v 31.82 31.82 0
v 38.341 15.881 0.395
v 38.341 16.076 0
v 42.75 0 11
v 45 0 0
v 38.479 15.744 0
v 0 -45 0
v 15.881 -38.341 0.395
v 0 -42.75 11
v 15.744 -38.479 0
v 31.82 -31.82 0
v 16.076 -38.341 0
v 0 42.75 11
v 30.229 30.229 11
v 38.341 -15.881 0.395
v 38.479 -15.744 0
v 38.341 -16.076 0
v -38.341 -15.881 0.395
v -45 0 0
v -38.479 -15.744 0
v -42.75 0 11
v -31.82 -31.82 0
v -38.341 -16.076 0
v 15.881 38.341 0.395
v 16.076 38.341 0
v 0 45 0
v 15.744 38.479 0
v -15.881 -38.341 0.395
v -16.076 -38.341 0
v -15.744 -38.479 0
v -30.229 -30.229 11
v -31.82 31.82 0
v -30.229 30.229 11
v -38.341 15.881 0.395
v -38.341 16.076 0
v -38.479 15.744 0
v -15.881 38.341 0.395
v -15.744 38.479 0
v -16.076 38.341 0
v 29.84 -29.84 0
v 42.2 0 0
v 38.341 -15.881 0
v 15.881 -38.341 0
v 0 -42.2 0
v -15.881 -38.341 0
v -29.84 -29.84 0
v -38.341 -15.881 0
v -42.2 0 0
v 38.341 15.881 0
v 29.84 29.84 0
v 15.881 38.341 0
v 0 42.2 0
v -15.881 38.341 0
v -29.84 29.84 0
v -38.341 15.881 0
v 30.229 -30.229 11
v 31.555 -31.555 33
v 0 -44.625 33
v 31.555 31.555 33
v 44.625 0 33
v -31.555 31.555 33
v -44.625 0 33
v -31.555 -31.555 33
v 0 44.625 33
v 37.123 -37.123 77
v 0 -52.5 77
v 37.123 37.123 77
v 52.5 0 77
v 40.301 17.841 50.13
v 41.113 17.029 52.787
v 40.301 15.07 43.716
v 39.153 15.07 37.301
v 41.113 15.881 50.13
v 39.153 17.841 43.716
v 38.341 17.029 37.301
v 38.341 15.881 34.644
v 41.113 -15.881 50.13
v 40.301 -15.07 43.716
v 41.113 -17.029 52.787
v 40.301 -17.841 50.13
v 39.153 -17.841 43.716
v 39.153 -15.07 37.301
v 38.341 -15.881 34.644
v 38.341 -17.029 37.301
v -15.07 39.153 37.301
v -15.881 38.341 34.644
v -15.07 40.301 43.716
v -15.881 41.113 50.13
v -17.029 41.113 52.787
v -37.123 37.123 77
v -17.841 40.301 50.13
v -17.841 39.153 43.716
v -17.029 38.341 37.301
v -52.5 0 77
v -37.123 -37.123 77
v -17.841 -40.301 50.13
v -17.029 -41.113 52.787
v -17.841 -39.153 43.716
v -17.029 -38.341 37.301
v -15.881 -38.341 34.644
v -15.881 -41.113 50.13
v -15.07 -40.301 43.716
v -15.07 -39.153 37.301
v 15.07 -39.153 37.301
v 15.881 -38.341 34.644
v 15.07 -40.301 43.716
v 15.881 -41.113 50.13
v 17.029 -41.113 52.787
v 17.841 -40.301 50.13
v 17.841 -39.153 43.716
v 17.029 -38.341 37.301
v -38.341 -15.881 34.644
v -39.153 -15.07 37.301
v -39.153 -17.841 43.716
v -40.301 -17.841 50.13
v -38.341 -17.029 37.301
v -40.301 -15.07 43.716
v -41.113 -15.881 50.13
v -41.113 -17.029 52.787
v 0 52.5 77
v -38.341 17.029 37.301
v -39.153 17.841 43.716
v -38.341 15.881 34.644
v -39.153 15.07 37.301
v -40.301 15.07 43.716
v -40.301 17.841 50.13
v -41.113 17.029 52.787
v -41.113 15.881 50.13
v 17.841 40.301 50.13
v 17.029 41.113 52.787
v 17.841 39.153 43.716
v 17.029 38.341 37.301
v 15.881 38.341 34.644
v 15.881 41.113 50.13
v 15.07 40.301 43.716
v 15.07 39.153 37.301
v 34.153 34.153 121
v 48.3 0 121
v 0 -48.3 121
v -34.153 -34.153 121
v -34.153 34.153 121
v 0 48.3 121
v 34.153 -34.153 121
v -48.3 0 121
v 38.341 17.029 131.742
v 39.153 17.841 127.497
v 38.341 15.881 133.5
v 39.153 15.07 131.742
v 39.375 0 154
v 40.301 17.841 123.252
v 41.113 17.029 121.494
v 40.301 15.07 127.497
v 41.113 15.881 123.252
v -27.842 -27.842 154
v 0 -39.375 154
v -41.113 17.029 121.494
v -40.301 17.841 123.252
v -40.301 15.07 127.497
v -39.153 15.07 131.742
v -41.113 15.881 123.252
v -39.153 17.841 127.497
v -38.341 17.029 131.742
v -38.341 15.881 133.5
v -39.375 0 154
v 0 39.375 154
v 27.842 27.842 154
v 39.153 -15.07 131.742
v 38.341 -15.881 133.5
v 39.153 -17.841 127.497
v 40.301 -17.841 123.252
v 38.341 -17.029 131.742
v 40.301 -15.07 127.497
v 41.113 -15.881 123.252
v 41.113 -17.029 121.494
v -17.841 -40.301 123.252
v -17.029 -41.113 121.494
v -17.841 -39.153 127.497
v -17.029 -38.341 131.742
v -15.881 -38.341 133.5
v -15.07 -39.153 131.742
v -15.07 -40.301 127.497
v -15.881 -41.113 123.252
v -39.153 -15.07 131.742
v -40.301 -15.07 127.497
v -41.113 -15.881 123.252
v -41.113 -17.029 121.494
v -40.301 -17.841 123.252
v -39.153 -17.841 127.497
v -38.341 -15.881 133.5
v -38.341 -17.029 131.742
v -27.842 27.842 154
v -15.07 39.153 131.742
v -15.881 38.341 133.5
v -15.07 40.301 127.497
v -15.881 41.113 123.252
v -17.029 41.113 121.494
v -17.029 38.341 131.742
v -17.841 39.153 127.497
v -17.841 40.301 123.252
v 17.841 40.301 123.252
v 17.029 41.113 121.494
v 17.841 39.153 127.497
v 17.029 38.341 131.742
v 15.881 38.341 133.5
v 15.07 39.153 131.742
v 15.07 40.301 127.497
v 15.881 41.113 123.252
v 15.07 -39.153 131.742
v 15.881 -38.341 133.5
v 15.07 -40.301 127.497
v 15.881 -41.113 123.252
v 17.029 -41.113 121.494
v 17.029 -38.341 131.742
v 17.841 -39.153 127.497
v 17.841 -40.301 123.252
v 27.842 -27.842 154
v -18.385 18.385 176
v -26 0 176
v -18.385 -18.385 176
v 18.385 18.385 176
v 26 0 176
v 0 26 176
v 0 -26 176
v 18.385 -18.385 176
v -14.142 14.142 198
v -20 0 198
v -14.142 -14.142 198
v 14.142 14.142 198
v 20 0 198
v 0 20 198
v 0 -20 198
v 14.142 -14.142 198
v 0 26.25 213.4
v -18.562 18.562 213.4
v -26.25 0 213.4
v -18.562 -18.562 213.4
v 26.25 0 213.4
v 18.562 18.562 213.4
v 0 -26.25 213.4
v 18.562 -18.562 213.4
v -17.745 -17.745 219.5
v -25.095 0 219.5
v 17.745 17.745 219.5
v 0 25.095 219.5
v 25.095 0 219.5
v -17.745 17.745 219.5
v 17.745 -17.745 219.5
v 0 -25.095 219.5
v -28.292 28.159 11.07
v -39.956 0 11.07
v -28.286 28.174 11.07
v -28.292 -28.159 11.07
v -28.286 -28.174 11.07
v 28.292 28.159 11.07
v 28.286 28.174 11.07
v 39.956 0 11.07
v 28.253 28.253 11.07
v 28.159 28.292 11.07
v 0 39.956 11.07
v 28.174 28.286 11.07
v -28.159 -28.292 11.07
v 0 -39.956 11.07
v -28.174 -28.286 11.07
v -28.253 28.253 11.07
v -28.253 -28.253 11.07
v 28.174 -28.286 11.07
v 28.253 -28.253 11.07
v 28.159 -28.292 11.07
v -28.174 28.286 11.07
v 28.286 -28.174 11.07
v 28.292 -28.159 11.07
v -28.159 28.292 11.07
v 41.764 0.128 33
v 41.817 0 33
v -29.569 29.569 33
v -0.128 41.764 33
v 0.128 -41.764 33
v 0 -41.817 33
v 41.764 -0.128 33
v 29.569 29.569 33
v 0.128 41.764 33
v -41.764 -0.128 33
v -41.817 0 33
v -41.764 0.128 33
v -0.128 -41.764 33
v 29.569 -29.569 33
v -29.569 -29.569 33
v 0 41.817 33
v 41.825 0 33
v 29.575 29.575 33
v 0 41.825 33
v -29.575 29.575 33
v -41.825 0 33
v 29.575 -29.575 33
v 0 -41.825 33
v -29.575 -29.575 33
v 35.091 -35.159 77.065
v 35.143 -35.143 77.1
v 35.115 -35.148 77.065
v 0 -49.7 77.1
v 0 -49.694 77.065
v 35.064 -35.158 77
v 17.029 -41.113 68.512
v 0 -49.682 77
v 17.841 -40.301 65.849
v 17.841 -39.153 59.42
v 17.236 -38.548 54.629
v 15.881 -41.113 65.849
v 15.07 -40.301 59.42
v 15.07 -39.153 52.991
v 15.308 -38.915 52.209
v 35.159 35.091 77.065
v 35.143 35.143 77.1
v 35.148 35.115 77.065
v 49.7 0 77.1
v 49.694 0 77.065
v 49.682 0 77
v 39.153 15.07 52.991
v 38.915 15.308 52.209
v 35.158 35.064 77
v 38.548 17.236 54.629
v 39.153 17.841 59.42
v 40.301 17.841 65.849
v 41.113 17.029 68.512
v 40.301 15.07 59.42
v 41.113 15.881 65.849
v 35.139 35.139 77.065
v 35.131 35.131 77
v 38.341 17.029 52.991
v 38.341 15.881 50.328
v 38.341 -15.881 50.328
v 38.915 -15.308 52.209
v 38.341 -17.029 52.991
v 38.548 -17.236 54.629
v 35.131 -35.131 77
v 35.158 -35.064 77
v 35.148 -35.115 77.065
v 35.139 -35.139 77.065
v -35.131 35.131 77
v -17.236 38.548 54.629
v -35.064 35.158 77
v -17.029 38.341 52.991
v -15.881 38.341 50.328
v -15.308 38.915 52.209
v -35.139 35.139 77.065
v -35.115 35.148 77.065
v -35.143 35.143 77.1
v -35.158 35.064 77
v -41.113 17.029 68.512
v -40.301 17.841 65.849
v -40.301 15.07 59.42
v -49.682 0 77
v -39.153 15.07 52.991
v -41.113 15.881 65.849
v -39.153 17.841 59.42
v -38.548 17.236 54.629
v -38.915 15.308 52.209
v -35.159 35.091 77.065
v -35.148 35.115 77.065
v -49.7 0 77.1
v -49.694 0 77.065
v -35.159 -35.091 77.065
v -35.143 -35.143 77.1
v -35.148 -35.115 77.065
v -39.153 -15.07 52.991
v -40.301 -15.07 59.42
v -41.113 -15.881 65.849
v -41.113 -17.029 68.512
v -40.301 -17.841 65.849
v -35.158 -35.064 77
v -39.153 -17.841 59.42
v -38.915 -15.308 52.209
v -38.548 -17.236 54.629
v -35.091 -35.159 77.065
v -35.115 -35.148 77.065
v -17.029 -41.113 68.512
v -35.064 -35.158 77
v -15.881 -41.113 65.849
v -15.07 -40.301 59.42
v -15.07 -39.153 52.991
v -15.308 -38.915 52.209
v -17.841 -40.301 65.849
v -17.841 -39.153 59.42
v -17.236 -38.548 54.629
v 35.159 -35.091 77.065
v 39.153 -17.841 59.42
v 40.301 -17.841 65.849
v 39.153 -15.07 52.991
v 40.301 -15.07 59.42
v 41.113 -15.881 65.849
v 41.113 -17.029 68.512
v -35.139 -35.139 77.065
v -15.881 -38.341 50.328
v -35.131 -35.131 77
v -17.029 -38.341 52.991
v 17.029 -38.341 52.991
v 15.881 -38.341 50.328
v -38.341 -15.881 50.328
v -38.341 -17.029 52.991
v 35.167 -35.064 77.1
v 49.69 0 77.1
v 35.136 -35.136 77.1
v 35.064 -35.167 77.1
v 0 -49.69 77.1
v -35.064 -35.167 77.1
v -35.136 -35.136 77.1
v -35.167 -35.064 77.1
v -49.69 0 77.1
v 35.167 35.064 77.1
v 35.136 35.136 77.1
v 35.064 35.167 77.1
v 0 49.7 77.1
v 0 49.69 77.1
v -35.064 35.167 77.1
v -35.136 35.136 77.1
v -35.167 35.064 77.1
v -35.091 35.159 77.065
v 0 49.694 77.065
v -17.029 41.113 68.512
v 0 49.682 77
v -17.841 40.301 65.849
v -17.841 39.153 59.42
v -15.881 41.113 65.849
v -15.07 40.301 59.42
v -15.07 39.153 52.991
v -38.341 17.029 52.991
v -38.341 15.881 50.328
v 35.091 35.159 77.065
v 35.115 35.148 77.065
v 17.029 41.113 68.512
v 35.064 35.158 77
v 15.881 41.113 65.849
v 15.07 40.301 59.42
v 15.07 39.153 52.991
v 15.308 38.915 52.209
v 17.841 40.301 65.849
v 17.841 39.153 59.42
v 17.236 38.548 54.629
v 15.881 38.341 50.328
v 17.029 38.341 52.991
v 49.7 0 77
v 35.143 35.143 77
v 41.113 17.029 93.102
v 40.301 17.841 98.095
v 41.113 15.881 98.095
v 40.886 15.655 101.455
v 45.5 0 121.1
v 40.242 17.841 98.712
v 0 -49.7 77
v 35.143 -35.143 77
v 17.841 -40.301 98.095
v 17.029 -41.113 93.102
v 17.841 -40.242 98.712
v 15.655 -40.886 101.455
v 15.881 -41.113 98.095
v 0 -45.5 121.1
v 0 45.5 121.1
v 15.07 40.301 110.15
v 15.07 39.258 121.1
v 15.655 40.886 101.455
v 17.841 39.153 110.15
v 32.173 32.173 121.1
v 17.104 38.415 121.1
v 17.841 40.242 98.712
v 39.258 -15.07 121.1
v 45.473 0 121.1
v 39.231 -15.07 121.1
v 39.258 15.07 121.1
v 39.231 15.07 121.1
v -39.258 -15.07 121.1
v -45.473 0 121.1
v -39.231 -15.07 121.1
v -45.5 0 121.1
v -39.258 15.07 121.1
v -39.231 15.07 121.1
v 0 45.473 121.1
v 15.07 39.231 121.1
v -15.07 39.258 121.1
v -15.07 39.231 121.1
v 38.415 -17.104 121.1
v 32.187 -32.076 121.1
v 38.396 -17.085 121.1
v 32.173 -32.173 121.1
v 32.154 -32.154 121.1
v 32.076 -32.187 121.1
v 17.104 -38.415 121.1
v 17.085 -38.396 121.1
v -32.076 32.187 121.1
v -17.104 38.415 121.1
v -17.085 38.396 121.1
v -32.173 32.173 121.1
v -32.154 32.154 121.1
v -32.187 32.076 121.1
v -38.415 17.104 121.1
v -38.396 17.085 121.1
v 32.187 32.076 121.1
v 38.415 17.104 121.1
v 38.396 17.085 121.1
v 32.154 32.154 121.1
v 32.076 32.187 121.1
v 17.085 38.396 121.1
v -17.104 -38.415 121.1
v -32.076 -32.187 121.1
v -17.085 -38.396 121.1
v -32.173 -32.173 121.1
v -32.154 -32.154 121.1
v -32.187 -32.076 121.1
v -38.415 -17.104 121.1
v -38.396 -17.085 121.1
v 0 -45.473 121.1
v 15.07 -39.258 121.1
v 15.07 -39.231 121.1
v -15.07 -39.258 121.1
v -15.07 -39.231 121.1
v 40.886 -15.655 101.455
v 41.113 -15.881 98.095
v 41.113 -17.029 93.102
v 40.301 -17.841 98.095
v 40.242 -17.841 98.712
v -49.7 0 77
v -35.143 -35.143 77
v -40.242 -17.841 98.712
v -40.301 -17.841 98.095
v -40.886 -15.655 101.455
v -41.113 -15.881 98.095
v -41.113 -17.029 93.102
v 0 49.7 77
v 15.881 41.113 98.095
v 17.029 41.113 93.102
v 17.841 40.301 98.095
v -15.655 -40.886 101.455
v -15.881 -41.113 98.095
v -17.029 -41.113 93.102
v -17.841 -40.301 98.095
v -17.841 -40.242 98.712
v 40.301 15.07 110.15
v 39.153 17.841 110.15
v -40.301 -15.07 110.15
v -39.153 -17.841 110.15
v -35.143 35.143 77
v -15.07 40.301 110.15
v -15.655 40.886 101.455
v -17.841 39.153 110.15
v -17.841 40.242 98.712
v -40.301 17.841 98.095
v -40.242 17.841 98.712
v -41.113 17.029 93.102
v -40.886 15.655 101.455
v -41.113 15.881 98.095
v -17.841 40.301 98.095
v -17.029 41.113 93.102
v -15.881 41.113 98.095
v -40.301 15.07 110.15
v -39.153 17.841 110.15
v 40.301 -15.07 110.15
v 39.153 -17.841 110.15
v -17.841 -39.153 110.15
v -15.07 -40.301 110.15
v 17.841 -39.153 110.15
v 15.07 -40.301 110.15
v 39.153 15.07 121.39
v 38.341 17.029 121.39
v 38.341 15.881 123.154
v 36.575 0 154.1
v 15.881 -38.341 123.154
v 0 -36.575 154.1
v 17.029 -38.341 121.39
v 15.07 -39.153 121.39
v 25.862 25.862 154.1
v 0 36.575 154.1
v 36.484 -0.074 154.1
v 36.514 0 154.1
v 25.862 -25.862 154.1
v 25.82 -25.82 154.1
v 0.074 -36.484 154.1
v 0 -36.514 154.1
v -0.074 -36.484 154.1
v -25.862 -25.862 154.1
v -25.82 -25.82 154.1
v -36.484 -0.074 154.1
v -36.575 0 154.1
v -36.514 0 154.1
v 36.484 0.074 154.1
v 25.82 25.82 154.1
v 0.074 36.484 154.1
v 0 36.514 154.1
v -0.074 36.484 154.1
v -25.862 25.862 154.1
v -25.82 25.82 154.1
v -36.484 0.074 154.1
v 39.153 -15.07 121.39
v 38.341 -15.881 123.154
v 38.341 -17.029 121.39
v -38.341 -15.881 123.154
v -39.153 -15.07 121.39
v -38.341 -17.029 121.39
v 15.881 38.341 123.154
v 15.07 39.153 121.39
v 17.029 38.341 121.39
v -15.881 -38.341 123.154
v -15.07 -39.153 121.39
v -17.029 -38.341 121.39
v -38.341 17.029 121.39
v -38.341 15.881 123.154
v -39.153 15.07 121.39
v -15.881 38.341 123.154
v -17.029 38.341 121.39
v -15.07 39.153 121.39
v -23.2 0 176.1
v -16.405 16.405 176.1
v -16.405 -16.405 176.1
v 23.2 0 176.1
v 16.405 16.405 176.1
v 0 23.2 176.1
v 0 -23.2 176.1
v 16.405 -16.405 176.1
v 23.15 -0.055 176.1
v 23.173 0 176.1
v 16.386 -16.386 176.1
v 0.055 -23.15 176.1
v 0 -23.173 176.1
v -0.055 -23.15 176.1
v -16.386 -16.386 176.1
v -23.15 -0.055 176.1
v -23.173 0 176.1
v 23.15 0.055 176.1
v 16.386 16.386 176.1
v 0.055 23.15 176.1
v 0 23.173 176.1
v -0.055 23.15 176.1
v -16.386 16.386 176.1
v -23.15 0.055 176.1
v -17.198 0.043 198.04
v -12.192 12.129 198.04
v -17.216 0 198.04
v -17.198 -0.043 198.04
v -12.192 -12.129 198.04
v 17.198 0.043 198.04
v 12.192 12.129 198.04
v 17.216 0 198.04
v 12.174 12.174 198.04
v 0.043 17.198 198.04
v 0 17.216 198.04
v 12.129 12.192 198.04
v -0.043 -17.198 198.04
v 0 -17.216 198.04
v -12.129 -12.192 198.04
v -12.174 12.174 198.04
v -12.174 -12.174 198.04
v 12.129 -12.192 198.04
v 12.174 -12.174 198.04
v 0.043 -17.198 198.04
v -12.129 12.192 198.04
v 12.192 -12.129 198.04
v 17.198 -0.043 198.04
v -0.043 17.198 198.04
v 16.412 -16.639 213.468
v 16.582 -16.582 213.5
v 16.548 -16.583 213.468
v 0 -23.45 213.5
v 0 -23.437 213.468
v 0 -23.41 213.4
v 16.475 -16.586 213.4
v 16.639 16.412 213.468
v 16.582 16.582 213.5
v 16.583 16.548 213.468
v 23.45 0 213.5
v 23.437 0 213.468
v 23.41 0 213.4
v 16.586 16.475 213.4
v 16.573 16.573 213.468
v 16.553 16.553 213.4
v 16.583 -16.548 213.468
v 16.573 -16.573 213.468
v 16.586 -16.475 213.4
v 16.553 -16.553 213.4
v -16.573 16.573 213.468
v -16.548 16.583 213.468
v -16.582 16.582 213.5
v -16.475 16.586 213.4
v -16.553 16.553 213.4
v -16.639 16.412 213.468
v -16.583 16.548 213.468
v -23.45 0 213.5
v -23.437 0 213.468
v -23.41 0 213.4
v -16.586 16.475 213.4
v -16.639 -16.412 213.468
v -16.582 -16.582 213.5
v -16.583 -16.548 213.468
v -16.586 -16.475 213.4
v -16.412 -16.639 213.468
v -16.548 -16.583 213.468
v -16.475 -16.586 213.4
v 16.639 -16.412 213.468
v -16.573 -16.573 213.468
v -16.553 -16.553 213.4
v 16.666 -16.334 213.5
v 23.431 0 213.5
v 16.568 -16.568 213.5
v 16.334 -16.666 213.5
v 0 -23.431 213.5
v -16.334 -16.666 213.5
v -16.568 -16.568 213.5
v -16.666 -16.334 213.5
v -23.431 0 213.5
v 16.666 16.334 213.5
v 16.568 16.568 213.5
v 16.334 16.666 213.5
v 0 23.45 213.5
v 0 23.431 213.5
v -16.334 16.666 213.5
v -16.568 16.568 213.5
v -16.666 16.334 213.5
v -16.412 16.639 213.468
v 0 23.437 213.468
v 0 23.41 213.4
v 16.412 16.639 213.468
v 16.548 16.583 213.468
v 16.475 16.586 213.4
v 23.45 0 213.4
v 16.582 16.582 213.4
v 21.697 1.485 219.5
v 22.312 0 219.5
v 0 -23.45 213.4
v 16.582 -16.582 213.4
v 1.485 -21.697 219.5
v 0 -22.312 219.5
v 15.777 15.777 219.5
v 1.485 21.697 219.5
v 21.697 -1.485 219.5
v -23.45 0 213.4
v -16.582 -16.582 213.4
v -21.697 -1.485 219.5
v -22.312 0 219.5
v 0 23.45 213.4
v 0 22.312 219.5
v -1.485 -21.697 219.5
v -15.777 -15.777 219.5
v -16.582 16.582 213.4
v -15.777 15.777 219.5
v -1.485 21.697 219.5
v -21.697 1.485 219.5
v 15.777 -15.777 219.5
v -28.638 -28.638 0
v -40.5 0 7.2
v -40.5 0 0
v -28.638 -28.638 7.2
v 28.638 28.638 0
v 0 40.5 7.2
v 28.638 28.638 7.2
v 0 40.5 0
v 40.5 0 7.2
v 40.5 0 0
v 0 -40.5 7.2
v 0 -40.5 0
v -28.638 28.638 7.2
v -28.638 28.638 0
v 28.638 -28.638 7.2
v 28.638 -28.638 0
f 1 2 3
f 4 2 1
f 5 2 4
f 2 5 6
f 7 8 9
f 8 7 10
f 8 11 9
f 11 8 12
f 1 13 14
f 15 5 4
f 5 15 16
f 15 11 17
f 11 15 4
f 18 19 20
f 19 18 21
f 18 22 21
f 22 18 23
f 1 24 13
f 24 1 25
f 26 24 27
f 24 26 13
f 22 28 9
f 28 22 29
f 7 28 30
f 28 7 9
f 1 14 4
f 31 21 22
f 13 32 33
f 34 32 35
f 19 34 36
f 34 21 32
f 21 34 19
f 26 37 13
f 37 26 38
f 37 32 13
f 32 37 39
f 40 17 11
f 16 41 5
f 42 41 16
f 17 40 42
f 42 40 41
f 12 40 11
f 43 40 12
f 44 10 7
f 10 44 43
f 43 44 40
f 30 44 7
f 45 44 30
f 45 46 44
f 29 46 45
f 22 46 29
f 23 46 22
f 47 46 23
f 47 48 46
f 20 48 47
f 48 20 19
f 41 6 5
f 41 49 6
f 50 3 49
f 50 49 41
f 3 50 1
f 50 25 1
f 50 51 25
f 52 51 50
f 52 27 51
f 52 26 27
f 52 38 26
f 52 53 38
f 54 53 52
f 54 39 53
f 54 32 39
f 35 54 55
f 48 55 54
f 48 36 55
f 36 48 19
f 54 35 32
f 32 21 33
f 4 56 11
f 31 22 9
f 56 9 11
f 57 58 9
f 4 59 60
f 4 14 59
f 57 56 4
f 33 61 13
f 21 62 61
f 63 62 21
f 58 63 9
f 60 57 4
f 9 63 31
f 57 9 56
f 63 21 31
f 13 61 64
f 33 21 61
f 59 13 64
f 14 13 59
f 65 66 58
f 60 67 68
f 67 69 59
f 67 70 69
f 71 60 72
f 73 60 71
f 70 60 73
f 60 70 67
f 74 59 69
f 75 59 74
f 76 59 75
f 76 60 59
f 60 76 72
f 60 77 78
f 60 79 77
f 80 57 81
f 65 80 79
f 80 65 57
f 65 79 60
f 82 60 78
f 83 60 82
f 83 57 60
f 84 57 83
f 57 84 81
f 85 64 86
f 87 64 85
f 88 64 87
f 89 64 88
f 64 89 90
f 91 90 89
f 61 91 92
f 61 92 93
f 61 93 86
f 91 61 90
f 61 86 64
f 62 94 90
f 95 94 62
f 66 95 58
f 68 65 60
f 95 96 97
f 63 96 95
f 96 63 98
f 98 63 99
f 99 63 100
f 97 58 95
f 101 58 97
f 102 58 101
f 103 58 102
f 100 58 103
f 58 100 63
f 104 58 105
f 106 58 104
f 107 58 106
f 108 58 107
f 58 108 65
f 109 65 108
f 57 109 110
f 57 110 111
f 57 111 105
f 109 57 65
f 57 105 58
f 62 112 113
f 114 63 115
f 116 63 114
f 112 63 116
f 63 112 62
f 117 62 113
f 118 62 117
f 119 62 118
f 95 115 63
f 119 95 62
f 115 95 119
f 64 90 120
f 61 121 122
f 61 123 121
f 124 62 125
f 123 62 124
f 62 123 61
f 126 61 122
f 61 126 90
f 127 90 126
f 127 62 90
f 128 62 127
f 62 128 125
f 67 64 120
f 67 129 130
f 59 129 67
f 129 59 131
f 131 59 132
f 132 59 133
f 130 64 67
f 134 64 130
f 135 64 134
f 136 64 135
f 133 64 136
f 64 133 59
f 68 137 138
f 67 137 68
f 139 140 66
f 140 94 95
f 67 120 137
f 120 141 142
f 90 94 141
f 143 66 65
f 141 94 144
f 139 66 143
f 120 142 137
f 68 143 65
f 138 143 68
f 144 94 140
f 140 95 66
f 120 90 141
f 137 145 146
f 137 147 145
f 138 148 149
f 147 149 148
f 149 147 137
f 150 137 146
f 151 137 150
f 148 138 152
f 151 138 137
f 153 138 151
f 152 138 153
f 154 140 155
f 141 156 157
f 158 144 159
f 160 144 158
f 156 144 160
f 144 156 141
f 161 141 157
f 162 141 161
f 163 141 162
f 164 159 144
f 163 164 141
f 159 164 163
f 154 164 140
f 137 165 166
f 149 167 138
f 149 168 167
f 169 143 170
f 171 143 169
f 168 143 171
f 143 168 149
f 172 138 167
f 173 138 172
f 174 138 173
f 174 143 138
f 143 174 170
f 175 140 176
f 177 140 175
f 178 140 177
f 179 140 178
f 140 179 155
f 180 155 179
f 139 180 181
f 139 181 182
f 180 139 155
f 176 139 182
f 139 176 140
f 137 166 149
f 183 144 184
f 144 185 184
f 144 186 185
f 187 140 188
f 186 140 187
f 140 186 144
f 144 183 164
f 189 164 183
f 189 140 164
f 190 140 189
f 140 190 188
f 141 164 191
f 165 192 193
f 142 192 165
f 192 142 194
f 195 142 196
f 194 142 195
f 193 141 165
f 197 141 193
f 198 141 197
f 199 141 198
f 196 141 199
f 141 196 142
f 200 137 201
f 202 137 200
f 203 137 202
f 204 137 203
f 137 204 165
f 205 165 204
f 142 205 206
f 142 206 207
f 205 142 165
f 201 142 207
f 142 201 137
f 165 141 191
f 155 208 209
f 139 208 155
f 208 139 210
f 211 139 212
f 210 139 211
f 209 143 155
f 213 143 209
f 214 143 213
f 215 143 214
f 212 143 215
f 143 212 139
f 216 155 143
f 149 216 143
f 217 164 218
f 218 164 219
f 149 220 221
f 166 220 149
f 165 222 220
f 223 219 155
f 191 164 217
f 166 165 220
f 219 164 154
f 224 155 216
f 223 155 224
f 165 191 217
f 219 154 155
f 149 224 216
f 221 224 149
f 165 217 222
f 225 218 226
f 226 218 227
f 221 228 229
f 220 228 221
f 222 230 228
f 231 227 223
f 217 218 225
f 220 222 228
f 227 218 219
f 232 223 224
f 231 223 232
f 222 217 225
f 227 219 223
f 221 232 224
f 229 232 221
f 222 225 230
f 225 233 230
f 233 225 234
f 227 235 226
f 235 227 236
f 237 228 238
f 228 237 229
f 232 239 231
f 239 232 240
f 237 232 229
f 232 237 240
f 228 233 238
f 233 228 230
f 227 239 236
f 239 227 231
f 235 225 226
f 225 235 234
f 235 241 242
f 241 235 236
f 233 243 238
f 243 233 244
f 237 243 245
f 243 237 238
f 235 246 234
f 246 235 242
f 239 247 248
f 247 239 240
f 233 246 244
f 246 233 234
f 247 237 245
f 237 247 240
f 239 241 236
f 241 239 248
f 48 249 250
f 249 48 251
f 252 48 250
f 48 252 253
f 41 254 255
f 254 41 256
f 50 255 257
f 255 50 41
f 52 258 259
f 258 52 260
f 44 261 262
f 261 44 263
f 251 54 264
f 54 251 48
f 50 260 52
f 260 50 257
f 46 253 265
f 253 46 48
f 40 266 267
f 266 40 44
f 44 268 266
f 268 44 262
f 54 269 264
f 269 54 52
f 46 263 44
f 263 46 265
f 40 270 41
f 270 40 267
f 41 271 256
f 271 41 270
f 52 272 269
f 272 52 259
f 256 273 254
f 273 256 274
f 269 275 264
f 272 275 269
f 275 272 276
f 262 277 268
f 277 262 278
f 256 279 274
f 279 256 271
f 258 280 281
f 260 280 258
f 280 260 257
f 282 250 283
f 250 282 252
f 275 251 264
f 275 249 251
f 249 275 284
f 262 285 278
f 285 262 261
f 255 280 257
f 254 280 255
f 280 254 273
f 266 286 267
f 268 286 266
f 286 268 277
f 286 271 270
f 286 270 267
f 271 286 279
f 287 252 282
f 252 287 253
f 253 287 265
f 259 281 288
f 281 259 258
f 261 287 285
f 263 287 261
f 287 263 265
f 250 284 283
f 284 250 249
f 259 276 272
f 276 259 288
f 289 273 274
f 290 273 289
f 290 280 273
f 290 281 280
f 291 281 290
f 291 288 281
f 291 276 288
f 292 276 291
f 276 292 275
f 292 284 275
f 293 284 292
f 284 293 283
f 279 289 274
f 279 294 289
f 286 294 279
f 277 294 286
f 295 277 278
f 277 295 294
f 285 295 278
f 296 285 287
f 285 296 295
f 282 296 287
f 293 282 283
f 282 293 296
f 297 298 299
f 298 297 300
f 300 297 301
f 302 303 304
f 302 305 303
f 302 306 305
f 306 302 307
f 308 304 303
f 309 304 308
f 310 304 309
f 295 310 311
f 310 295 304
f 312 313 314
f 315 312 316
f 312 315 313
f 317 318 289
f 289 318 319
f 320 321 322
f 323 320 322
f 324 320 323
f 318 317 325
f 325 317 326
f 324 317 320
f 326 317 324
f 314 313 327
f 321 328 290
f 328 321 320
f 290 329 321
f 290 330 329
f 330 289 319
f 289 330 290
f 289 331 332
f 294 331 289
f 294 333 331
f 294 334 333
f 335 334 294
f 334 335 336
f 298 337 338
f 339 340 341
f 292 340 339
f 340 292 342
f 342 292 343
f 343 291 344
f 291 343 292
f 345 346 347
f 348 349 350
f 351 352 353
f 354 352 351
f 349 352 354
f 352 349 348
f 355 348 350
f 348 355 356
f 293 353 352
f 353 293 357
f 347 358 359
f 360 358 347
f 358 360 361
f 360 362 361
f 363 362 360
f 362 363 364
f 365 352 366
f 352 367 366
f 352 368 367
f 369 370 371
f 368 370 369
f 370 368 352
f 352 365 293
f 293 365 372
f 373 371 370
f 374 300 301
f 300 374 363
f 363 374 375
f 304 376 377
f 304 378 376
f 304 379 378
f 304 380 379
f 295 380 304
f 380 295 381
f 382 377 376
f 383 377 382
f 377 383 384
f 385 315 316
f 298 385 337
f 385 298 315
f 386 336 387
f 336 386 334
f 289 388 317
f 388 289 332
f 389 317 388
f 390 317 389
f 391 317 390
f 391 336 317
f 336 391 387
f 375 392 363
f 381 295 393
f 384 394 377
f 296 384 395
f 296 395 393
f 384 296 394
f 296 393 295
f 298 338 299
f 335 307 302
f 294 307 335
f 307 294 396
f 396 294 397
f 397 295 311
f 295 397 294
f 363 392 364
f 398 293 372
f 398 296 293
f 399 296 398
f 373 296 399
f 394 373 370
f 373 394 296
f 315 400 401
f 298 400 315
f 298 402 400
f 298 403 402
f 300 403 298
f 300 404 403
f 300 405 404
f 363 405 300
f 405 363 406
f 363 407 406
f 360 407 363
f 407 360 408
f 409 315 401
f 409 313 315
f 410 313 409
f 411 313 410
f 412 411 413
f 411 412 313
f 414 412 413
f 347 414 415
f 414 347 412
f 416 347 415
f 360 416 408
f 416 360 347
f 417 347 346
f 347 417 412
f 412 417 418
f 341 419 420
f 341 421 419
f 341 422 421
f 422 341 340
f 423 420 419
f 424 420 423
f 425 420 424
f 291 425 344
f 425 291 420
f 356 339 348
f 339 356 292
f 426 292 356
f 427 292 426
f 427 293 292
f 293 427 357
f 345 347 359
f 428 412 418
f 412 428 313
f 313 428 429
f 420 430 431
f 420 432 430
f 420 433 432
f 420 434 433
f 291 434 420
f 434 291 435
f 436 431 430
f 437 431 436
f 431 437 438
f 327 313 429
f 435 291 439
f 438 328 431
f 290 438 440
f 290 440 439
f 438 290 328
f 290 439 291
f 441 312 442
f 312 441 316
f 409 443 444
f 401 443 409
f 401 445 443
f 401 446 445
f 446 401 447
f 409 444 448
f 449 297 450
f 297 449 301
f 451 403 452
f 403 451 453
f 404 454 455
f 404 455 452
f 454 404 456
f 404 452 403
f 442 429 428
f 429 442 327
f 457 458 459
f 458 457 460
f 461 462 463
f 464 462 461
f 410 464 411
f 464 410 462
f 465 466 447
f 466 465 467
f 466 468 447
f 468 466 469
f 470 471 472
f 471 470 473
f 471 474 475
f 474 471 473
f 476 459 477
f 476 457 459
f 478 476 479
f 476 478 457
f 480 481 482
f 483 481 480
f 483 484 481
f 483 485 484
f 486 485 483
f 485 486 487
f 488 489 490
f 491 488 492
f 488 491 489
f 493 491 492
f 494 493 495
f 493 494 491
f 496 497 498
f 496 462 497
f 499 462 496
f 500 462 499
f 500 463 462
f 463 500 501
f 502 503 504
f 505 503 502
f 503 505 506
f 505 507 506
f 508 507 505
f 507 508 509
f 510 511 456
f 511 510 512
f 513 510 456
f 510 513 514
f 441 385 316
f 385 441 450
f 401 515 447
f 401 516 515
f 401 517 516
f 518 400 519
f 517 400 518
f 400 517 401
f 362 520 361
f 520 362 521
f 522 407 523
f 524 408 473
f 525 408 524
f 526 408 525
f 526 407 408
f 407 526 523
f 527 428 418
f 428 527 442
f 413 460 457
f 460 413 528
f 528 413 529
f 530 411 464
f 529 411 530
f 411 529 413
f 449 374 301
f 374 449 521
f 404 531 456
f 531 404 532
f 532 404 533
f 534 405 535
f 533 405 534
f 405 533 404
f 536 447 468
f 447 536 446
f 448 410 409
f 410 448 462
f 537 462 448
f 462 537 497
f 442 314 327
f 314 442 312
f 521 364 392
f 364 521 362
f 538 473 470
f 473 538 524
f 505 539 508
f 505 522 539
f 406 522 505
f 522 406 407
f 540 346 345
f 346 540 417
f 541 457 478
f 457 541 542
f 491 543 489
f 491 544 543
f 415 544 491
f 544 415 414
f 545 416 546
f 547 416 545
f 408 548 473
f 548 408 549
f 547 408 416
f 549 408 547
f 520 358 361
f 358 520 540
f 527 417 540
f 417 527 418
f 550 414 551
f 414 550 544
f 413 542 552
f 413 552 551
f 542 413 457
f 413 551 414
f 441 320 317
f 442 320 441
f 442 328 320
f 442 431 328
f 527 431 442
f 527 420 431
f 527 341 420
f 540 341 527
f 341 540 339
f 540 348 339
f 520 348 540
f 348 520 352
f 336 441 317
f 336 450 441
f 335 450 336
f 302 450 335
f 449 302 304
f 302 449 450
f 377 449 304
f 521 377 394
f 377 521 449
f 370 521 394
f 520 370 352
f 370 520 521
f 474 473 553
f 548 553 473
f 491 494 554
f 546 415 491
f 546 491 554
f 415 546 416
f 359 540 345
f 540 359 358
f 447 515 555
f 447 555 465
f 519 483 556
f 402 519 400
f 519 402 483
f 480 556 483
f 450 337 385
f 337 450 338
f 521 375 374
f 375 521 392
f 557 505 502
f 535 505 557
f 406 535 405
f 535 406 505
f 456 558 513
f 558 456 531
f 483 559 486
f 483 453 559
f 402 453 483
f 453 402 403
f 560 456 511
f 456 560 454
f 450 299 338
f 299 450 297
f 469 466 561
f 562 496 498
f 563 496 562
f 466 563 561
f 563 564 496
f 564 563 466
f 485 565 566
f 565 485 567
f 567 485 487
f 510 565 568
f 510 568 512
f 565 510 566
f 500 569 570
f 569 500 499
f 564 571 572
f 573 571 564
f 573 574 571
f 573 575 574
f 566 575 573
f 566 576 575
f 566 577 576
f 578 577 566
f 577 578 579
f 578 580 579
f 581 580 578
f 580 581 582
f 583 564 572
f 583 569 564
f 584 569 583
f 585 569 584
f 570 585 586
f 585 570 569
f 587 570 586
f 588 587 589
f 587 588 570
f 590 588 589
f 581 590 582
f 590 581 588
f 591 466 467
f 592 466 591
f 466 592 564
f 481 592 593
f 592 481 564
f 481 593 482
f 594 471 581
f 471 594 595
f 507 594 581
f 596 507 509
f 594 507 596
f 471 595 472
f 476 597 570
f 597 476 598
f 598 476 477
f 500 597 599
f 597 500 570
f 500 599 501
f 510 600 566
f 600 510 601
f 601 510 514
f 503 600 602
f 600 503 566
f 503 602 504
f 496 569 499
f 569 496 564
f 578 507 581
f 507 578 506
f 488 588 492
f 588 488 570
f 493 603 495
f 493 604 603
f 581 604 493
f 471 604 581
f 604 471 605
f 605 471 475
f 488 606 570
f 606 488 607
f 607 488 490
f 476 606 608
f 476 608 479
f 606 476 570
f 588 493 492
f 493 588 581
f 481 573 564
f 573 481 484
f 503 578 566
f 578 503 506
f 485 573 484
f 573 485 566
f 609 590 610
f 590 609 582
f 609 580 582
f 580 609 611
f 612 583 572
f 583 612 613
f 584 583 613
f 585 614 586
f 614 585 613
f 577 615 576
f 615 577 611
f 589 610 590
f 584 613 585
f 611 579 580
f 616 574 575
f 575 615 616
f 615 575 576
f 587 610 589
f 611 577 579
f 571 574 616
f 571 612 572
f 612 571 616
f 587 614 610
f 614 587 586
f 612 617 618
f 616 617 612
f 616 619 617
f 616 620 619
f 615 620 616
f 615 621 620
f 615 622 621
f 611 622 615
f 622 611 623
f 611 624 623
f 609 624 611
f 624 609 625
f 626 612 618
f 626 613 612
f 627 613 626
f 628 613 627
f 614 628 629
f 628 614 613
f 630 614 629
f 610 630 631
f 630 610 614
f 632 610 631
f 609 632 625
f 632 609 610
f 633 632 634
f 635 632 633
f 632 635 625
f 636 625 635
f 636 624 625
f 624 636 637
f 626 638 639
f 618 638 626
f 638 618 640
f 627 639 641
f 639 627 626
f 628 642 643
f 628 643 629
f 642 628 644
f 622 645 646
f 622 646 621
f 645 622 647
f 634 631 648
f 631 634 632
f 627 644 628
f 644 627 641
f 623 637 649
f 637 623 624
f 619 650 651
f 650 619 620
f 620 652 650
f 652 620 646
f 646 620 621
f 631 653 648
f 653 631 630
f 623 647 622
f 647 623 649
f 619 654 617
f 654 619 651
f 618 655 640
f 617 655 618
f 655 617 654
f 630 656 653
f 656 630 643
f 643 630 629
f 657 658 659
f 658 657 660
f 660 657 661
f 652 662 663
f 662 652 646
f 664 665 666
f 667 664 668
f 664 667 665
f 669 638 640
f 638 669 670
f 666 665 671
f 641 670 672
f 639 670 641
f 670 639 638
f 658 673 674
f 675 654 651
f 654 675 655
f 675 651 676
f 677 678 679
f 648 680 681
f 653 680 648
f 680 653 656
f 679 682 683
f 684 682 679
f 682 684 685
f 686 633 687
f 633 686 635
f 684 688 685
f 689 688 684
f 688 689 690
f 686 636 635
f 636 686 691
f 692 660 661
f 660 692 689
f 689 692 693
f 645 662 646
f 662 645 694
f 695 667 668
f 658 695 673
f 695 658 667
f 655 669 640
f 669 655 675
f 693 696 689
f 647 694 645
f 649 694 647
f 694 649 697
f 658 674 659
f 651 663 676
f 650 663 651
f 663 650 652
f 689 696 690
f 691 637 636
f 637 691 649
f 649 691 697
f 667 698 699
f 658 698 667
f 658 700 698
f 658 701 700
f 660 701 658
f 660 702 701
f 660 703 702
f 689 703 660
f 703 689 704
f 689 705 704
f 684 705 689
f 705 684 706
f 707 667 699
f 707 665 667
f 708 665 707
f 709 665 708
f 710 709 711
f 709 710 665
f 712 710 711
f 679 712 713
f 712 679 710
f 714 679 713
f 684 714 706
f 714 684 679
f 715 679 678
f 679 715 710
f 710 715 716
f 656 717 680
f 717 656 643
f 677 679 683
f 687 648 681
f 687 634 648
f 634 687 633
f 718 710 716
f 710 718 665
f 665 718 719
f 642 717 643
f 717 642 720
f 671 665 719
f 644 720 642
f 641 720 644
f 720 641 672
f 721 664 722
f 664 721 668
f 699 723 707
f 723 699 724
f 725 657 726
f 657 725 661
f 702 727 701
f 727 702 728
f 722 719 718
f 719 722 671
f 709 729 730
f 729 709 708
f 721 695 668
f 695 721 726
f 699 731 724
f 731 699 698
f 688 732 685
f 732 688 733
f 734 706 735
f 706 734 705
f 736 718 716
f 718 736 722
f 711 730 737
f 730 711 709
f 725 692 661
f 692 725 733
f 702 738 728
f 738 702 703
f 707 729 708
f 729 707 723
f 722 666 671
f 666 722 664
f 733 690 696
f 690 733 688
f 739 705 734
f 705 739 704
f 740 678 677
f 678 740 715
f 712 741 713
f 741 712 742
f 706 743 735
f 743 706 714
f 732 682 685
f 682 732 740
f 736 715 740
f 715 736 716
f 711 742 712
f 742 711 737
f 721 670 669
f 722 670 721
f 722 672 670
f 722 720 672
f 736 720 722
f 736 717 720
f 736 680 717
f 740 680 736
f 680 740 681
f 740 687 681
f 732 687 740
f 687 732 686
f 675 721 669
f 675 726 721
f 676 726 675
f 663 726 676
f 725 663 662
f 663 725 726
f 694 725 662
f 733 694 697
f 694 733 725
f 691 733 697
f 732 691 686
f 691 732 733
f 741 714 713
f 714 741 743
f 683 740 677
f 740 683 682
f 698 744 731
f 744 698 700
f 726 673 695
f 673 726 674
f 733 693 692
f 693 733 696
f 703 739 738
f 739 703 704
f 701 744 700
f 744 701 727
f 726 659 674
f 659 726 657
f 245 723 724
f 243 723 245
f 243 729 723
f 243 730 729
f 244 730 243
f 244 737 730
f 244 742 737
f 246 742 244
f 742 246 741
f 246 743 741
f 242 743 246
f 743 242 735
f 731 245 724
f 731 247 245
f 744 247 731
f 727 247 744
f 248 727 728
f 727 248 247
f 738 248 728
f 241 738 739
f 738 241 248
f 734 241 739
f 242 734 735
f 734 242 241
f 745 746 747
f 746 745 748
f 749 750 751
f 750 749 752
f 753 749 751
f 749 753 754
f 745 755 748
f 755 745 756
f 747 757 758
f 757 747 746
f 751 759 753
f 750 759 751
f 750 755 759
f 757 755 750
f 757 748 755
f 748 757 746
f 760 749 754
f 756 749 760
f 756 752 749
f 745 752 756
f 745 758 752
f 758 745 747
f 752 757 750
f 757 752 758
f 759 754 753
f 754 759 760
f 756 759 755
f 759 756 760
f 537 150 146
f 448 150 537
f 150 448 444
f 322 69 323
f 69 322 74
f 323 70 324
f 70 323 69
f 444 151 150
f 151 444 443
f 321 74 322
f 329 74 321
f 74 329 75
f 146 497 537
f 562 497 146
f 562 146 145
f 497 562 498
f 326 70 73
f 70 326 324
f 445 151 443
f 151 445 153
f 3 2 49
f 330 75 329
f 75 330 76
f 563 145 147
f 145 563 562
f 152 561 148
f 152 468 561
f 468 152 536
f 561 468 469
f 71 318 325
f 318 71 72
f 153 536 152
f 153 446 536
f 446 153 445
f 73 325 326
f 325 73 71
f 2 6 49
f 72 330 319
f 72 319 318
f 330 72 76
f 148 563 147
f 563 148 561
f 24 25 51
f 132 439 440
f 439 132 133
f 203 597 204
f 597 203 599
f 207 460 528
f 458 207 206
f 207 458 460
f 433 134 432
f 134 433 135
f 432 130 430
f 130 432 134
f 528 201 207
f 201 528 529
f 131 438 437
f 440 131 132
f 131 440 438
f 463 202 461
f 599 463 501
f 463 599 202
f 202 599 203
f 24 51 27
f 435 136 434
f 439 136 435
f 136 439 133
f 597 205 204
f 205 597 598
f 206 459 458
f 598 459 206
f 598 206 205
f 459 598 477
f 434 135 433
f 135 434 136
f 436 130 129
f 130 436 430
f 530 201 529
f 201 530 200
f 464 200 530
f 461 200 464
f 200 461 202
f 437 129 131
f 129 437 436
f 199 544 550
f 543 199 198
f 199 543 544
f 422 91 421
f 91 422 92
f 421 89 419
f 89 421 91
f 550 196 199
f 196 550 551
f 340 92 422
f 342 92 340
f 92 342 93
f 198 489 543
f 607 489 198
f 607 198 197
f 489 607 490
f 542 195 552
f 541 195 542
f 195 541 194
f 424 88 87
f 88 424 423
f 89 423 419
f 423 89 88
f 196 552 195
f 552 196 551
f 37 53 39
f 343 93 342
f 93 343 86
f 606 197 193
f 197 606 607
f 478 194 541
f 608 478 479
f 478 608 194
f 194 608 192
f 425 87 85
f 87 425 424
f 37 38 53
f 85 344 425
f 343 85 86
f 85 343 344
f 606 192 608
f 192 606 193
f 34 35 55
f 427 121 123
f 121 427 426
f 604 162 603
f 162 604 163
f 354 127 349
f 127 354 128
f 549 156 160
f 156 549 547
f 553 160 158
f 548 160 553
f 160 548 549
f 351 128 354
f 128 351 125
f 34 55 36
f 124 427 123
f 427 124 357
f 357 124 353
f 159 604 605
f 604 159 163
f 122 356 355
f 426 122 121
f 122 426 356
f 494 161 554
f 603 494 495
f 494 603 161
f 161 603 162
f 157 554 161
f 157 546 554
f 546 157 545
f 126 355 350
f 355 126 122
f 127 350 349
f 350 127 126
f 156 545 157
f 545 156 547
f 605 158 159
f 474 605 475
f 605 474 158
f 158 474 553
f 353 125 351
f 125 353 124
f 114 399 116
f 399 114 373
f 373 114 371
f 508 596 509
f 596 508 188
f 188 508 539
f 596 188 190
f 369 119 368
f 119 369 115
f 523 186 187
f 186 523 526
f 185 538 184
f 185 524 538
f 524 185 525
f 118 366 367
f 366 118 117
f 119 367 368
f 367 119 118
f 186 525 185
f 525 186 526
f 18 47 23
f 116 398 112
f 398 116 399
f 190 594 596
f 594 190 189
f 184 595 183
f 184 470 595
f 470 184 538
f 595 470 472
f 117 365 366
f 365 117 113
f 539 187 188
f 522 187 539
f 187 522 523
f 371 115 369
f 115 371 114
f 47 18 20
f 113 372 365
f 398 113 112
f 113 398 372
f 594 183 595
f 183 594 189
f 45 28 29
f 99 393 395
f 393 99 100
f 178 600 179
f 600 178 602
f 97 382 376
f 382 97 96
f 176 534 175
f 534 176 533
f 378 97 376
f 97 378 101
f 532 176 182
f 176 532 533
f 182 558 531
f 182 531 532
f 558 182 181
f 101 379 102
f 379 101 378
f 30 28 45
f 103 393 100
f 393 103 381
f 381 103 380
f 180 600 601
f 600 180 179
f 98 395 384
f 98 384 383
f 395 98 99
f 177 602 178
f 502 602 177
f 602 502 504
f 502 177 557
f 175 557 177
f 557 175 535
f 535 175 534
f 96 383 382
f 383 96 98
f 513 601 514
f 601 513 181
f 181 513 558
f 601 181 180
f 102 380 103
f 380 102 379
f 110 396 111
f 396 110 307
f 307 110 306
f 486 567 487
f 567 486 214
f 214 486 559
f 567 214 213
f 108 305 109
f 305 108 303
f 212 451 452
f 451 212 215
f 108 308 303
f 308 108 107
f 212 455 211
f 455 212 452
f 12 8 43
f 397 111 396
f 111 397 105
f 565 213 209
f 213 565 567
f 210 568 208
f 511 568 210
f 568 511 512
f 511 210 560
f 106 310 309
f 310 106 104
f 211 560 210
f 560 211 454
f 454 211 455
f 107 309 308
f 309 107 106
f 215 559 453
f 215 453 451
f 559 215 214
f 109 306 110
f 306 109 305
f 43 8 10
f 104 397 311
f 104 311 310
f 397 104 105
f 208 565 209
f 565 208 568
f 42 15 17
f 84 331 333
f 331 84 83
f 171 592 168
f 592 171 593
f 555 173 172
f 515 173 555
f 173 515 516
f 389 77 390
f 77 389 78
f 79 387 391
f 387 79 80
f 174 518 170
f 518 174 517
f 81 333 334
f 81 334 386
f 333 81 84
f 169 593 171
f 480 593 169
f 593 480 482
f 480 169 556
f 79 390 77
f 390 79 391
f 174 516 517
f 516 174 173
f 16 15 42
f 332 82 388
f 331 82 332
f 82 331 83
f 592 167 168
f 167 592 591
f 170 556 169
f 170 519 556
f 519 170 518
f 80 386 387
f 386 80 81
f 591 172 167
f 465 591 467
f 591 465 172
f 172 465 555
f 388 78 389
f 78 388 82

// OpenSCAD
// Crystal Faceted Vase — Sculptural Object / Gift
// PETG (translucent filament = stunning light play)
// Single color, 0.15mm, 2 walls, 0% infill (hollow)
// Bed: fits P2S 256x256mm

SIDES      = 8;     // Facet count (6 = hexagonal, 8 = octagonal, 12 = crystal)
HEIGHT     = 220;
BASE_D     = 90;
NECK_D     = 40;
MID_D      = 105;   // Widest point
WALL       = 2.8;
BASE_H     = 12;
NECK_H     = 175;   // Height of widest point from bottom
OPENING_D  = 50;

// Profile control points [height_fraction, radius]
profile = [
    [0.00, BASE_D/2],
    [0.05, BASE_D/2 * 0.95],
    [0.15, MID_D/2 * 0.85],
    [0.35, MID_D/2],
    [0.55, MID_D/2 * 0.92],
    [0.70, MID_D/2 * 0.75],
    [0.80, NECK_D/2 * 1.3],
    [0.90, NECK_D/2],
    [0.97, OPENING_D/2 * 1.05],
    [1.00, OPENING_D/2]
];

module vase_shell() {
    segments = len(profile) - 1;
    difference() {
        // Outer faceted form
        union() {
            for (i = [0 : segments - 1]) {
                h0 = profile[i][0]   * HEIGHT;
                h1 = profile[i+1][0] * HEIGHT;
                r0 = profile[i][1];
                r1 = profile[i+1][1];
                // Each segment is a prism frustum
                translate([0, 0, h0])
                    cylinder(r1 = r0, r2 = r1, h = h1 - h0, $fn = SIDES);
            }
        }
        // Inner cavity
        translate([0, 0, BASE_H]) {
            for (i = [0 : segments - 1]) {
                h0 = profile[i][0]   * HEIGHT - BASE_H;
                h1 = profile[i+1][0] * HEIGHT - BASE_H;
                r0 = max(profile[i][1]   - WALL, 2);
                r1 = max(profile[i+1][1] - WALL, 2);
                translate([0, 0, h0])
                    cylinder(r1 = r0, r2 = r1, h = h1 - h0 + 0.1, $fn = SIDES);
            }
        }
        // Clean opening
        translate([0, 0, HEIGHT - 0.5])
            cylinder(d = OPENING_D + WALL * 0.5, h = 10, $fn = SIDES);
    }
    // Solid base cap
    cylinder(d = BASE_D * 0.9, h = BASE_H * 0.6, $fn = SIDES);
}

module facet_groove() {
    // Subtle vertical groove at each facet edge — catches light
    for (i = [0 : SIDES - 1])
        rotate([0, 0, i * 360/SIDES + 180/SIDES])
            translate([BASE_D/2 - 2, 0, 0])
                cylinder(d = 3, h = HEIGHT * 0.7, $fn = 8);
}

difference() {
    vase_shell();
    facet_groove();
}
